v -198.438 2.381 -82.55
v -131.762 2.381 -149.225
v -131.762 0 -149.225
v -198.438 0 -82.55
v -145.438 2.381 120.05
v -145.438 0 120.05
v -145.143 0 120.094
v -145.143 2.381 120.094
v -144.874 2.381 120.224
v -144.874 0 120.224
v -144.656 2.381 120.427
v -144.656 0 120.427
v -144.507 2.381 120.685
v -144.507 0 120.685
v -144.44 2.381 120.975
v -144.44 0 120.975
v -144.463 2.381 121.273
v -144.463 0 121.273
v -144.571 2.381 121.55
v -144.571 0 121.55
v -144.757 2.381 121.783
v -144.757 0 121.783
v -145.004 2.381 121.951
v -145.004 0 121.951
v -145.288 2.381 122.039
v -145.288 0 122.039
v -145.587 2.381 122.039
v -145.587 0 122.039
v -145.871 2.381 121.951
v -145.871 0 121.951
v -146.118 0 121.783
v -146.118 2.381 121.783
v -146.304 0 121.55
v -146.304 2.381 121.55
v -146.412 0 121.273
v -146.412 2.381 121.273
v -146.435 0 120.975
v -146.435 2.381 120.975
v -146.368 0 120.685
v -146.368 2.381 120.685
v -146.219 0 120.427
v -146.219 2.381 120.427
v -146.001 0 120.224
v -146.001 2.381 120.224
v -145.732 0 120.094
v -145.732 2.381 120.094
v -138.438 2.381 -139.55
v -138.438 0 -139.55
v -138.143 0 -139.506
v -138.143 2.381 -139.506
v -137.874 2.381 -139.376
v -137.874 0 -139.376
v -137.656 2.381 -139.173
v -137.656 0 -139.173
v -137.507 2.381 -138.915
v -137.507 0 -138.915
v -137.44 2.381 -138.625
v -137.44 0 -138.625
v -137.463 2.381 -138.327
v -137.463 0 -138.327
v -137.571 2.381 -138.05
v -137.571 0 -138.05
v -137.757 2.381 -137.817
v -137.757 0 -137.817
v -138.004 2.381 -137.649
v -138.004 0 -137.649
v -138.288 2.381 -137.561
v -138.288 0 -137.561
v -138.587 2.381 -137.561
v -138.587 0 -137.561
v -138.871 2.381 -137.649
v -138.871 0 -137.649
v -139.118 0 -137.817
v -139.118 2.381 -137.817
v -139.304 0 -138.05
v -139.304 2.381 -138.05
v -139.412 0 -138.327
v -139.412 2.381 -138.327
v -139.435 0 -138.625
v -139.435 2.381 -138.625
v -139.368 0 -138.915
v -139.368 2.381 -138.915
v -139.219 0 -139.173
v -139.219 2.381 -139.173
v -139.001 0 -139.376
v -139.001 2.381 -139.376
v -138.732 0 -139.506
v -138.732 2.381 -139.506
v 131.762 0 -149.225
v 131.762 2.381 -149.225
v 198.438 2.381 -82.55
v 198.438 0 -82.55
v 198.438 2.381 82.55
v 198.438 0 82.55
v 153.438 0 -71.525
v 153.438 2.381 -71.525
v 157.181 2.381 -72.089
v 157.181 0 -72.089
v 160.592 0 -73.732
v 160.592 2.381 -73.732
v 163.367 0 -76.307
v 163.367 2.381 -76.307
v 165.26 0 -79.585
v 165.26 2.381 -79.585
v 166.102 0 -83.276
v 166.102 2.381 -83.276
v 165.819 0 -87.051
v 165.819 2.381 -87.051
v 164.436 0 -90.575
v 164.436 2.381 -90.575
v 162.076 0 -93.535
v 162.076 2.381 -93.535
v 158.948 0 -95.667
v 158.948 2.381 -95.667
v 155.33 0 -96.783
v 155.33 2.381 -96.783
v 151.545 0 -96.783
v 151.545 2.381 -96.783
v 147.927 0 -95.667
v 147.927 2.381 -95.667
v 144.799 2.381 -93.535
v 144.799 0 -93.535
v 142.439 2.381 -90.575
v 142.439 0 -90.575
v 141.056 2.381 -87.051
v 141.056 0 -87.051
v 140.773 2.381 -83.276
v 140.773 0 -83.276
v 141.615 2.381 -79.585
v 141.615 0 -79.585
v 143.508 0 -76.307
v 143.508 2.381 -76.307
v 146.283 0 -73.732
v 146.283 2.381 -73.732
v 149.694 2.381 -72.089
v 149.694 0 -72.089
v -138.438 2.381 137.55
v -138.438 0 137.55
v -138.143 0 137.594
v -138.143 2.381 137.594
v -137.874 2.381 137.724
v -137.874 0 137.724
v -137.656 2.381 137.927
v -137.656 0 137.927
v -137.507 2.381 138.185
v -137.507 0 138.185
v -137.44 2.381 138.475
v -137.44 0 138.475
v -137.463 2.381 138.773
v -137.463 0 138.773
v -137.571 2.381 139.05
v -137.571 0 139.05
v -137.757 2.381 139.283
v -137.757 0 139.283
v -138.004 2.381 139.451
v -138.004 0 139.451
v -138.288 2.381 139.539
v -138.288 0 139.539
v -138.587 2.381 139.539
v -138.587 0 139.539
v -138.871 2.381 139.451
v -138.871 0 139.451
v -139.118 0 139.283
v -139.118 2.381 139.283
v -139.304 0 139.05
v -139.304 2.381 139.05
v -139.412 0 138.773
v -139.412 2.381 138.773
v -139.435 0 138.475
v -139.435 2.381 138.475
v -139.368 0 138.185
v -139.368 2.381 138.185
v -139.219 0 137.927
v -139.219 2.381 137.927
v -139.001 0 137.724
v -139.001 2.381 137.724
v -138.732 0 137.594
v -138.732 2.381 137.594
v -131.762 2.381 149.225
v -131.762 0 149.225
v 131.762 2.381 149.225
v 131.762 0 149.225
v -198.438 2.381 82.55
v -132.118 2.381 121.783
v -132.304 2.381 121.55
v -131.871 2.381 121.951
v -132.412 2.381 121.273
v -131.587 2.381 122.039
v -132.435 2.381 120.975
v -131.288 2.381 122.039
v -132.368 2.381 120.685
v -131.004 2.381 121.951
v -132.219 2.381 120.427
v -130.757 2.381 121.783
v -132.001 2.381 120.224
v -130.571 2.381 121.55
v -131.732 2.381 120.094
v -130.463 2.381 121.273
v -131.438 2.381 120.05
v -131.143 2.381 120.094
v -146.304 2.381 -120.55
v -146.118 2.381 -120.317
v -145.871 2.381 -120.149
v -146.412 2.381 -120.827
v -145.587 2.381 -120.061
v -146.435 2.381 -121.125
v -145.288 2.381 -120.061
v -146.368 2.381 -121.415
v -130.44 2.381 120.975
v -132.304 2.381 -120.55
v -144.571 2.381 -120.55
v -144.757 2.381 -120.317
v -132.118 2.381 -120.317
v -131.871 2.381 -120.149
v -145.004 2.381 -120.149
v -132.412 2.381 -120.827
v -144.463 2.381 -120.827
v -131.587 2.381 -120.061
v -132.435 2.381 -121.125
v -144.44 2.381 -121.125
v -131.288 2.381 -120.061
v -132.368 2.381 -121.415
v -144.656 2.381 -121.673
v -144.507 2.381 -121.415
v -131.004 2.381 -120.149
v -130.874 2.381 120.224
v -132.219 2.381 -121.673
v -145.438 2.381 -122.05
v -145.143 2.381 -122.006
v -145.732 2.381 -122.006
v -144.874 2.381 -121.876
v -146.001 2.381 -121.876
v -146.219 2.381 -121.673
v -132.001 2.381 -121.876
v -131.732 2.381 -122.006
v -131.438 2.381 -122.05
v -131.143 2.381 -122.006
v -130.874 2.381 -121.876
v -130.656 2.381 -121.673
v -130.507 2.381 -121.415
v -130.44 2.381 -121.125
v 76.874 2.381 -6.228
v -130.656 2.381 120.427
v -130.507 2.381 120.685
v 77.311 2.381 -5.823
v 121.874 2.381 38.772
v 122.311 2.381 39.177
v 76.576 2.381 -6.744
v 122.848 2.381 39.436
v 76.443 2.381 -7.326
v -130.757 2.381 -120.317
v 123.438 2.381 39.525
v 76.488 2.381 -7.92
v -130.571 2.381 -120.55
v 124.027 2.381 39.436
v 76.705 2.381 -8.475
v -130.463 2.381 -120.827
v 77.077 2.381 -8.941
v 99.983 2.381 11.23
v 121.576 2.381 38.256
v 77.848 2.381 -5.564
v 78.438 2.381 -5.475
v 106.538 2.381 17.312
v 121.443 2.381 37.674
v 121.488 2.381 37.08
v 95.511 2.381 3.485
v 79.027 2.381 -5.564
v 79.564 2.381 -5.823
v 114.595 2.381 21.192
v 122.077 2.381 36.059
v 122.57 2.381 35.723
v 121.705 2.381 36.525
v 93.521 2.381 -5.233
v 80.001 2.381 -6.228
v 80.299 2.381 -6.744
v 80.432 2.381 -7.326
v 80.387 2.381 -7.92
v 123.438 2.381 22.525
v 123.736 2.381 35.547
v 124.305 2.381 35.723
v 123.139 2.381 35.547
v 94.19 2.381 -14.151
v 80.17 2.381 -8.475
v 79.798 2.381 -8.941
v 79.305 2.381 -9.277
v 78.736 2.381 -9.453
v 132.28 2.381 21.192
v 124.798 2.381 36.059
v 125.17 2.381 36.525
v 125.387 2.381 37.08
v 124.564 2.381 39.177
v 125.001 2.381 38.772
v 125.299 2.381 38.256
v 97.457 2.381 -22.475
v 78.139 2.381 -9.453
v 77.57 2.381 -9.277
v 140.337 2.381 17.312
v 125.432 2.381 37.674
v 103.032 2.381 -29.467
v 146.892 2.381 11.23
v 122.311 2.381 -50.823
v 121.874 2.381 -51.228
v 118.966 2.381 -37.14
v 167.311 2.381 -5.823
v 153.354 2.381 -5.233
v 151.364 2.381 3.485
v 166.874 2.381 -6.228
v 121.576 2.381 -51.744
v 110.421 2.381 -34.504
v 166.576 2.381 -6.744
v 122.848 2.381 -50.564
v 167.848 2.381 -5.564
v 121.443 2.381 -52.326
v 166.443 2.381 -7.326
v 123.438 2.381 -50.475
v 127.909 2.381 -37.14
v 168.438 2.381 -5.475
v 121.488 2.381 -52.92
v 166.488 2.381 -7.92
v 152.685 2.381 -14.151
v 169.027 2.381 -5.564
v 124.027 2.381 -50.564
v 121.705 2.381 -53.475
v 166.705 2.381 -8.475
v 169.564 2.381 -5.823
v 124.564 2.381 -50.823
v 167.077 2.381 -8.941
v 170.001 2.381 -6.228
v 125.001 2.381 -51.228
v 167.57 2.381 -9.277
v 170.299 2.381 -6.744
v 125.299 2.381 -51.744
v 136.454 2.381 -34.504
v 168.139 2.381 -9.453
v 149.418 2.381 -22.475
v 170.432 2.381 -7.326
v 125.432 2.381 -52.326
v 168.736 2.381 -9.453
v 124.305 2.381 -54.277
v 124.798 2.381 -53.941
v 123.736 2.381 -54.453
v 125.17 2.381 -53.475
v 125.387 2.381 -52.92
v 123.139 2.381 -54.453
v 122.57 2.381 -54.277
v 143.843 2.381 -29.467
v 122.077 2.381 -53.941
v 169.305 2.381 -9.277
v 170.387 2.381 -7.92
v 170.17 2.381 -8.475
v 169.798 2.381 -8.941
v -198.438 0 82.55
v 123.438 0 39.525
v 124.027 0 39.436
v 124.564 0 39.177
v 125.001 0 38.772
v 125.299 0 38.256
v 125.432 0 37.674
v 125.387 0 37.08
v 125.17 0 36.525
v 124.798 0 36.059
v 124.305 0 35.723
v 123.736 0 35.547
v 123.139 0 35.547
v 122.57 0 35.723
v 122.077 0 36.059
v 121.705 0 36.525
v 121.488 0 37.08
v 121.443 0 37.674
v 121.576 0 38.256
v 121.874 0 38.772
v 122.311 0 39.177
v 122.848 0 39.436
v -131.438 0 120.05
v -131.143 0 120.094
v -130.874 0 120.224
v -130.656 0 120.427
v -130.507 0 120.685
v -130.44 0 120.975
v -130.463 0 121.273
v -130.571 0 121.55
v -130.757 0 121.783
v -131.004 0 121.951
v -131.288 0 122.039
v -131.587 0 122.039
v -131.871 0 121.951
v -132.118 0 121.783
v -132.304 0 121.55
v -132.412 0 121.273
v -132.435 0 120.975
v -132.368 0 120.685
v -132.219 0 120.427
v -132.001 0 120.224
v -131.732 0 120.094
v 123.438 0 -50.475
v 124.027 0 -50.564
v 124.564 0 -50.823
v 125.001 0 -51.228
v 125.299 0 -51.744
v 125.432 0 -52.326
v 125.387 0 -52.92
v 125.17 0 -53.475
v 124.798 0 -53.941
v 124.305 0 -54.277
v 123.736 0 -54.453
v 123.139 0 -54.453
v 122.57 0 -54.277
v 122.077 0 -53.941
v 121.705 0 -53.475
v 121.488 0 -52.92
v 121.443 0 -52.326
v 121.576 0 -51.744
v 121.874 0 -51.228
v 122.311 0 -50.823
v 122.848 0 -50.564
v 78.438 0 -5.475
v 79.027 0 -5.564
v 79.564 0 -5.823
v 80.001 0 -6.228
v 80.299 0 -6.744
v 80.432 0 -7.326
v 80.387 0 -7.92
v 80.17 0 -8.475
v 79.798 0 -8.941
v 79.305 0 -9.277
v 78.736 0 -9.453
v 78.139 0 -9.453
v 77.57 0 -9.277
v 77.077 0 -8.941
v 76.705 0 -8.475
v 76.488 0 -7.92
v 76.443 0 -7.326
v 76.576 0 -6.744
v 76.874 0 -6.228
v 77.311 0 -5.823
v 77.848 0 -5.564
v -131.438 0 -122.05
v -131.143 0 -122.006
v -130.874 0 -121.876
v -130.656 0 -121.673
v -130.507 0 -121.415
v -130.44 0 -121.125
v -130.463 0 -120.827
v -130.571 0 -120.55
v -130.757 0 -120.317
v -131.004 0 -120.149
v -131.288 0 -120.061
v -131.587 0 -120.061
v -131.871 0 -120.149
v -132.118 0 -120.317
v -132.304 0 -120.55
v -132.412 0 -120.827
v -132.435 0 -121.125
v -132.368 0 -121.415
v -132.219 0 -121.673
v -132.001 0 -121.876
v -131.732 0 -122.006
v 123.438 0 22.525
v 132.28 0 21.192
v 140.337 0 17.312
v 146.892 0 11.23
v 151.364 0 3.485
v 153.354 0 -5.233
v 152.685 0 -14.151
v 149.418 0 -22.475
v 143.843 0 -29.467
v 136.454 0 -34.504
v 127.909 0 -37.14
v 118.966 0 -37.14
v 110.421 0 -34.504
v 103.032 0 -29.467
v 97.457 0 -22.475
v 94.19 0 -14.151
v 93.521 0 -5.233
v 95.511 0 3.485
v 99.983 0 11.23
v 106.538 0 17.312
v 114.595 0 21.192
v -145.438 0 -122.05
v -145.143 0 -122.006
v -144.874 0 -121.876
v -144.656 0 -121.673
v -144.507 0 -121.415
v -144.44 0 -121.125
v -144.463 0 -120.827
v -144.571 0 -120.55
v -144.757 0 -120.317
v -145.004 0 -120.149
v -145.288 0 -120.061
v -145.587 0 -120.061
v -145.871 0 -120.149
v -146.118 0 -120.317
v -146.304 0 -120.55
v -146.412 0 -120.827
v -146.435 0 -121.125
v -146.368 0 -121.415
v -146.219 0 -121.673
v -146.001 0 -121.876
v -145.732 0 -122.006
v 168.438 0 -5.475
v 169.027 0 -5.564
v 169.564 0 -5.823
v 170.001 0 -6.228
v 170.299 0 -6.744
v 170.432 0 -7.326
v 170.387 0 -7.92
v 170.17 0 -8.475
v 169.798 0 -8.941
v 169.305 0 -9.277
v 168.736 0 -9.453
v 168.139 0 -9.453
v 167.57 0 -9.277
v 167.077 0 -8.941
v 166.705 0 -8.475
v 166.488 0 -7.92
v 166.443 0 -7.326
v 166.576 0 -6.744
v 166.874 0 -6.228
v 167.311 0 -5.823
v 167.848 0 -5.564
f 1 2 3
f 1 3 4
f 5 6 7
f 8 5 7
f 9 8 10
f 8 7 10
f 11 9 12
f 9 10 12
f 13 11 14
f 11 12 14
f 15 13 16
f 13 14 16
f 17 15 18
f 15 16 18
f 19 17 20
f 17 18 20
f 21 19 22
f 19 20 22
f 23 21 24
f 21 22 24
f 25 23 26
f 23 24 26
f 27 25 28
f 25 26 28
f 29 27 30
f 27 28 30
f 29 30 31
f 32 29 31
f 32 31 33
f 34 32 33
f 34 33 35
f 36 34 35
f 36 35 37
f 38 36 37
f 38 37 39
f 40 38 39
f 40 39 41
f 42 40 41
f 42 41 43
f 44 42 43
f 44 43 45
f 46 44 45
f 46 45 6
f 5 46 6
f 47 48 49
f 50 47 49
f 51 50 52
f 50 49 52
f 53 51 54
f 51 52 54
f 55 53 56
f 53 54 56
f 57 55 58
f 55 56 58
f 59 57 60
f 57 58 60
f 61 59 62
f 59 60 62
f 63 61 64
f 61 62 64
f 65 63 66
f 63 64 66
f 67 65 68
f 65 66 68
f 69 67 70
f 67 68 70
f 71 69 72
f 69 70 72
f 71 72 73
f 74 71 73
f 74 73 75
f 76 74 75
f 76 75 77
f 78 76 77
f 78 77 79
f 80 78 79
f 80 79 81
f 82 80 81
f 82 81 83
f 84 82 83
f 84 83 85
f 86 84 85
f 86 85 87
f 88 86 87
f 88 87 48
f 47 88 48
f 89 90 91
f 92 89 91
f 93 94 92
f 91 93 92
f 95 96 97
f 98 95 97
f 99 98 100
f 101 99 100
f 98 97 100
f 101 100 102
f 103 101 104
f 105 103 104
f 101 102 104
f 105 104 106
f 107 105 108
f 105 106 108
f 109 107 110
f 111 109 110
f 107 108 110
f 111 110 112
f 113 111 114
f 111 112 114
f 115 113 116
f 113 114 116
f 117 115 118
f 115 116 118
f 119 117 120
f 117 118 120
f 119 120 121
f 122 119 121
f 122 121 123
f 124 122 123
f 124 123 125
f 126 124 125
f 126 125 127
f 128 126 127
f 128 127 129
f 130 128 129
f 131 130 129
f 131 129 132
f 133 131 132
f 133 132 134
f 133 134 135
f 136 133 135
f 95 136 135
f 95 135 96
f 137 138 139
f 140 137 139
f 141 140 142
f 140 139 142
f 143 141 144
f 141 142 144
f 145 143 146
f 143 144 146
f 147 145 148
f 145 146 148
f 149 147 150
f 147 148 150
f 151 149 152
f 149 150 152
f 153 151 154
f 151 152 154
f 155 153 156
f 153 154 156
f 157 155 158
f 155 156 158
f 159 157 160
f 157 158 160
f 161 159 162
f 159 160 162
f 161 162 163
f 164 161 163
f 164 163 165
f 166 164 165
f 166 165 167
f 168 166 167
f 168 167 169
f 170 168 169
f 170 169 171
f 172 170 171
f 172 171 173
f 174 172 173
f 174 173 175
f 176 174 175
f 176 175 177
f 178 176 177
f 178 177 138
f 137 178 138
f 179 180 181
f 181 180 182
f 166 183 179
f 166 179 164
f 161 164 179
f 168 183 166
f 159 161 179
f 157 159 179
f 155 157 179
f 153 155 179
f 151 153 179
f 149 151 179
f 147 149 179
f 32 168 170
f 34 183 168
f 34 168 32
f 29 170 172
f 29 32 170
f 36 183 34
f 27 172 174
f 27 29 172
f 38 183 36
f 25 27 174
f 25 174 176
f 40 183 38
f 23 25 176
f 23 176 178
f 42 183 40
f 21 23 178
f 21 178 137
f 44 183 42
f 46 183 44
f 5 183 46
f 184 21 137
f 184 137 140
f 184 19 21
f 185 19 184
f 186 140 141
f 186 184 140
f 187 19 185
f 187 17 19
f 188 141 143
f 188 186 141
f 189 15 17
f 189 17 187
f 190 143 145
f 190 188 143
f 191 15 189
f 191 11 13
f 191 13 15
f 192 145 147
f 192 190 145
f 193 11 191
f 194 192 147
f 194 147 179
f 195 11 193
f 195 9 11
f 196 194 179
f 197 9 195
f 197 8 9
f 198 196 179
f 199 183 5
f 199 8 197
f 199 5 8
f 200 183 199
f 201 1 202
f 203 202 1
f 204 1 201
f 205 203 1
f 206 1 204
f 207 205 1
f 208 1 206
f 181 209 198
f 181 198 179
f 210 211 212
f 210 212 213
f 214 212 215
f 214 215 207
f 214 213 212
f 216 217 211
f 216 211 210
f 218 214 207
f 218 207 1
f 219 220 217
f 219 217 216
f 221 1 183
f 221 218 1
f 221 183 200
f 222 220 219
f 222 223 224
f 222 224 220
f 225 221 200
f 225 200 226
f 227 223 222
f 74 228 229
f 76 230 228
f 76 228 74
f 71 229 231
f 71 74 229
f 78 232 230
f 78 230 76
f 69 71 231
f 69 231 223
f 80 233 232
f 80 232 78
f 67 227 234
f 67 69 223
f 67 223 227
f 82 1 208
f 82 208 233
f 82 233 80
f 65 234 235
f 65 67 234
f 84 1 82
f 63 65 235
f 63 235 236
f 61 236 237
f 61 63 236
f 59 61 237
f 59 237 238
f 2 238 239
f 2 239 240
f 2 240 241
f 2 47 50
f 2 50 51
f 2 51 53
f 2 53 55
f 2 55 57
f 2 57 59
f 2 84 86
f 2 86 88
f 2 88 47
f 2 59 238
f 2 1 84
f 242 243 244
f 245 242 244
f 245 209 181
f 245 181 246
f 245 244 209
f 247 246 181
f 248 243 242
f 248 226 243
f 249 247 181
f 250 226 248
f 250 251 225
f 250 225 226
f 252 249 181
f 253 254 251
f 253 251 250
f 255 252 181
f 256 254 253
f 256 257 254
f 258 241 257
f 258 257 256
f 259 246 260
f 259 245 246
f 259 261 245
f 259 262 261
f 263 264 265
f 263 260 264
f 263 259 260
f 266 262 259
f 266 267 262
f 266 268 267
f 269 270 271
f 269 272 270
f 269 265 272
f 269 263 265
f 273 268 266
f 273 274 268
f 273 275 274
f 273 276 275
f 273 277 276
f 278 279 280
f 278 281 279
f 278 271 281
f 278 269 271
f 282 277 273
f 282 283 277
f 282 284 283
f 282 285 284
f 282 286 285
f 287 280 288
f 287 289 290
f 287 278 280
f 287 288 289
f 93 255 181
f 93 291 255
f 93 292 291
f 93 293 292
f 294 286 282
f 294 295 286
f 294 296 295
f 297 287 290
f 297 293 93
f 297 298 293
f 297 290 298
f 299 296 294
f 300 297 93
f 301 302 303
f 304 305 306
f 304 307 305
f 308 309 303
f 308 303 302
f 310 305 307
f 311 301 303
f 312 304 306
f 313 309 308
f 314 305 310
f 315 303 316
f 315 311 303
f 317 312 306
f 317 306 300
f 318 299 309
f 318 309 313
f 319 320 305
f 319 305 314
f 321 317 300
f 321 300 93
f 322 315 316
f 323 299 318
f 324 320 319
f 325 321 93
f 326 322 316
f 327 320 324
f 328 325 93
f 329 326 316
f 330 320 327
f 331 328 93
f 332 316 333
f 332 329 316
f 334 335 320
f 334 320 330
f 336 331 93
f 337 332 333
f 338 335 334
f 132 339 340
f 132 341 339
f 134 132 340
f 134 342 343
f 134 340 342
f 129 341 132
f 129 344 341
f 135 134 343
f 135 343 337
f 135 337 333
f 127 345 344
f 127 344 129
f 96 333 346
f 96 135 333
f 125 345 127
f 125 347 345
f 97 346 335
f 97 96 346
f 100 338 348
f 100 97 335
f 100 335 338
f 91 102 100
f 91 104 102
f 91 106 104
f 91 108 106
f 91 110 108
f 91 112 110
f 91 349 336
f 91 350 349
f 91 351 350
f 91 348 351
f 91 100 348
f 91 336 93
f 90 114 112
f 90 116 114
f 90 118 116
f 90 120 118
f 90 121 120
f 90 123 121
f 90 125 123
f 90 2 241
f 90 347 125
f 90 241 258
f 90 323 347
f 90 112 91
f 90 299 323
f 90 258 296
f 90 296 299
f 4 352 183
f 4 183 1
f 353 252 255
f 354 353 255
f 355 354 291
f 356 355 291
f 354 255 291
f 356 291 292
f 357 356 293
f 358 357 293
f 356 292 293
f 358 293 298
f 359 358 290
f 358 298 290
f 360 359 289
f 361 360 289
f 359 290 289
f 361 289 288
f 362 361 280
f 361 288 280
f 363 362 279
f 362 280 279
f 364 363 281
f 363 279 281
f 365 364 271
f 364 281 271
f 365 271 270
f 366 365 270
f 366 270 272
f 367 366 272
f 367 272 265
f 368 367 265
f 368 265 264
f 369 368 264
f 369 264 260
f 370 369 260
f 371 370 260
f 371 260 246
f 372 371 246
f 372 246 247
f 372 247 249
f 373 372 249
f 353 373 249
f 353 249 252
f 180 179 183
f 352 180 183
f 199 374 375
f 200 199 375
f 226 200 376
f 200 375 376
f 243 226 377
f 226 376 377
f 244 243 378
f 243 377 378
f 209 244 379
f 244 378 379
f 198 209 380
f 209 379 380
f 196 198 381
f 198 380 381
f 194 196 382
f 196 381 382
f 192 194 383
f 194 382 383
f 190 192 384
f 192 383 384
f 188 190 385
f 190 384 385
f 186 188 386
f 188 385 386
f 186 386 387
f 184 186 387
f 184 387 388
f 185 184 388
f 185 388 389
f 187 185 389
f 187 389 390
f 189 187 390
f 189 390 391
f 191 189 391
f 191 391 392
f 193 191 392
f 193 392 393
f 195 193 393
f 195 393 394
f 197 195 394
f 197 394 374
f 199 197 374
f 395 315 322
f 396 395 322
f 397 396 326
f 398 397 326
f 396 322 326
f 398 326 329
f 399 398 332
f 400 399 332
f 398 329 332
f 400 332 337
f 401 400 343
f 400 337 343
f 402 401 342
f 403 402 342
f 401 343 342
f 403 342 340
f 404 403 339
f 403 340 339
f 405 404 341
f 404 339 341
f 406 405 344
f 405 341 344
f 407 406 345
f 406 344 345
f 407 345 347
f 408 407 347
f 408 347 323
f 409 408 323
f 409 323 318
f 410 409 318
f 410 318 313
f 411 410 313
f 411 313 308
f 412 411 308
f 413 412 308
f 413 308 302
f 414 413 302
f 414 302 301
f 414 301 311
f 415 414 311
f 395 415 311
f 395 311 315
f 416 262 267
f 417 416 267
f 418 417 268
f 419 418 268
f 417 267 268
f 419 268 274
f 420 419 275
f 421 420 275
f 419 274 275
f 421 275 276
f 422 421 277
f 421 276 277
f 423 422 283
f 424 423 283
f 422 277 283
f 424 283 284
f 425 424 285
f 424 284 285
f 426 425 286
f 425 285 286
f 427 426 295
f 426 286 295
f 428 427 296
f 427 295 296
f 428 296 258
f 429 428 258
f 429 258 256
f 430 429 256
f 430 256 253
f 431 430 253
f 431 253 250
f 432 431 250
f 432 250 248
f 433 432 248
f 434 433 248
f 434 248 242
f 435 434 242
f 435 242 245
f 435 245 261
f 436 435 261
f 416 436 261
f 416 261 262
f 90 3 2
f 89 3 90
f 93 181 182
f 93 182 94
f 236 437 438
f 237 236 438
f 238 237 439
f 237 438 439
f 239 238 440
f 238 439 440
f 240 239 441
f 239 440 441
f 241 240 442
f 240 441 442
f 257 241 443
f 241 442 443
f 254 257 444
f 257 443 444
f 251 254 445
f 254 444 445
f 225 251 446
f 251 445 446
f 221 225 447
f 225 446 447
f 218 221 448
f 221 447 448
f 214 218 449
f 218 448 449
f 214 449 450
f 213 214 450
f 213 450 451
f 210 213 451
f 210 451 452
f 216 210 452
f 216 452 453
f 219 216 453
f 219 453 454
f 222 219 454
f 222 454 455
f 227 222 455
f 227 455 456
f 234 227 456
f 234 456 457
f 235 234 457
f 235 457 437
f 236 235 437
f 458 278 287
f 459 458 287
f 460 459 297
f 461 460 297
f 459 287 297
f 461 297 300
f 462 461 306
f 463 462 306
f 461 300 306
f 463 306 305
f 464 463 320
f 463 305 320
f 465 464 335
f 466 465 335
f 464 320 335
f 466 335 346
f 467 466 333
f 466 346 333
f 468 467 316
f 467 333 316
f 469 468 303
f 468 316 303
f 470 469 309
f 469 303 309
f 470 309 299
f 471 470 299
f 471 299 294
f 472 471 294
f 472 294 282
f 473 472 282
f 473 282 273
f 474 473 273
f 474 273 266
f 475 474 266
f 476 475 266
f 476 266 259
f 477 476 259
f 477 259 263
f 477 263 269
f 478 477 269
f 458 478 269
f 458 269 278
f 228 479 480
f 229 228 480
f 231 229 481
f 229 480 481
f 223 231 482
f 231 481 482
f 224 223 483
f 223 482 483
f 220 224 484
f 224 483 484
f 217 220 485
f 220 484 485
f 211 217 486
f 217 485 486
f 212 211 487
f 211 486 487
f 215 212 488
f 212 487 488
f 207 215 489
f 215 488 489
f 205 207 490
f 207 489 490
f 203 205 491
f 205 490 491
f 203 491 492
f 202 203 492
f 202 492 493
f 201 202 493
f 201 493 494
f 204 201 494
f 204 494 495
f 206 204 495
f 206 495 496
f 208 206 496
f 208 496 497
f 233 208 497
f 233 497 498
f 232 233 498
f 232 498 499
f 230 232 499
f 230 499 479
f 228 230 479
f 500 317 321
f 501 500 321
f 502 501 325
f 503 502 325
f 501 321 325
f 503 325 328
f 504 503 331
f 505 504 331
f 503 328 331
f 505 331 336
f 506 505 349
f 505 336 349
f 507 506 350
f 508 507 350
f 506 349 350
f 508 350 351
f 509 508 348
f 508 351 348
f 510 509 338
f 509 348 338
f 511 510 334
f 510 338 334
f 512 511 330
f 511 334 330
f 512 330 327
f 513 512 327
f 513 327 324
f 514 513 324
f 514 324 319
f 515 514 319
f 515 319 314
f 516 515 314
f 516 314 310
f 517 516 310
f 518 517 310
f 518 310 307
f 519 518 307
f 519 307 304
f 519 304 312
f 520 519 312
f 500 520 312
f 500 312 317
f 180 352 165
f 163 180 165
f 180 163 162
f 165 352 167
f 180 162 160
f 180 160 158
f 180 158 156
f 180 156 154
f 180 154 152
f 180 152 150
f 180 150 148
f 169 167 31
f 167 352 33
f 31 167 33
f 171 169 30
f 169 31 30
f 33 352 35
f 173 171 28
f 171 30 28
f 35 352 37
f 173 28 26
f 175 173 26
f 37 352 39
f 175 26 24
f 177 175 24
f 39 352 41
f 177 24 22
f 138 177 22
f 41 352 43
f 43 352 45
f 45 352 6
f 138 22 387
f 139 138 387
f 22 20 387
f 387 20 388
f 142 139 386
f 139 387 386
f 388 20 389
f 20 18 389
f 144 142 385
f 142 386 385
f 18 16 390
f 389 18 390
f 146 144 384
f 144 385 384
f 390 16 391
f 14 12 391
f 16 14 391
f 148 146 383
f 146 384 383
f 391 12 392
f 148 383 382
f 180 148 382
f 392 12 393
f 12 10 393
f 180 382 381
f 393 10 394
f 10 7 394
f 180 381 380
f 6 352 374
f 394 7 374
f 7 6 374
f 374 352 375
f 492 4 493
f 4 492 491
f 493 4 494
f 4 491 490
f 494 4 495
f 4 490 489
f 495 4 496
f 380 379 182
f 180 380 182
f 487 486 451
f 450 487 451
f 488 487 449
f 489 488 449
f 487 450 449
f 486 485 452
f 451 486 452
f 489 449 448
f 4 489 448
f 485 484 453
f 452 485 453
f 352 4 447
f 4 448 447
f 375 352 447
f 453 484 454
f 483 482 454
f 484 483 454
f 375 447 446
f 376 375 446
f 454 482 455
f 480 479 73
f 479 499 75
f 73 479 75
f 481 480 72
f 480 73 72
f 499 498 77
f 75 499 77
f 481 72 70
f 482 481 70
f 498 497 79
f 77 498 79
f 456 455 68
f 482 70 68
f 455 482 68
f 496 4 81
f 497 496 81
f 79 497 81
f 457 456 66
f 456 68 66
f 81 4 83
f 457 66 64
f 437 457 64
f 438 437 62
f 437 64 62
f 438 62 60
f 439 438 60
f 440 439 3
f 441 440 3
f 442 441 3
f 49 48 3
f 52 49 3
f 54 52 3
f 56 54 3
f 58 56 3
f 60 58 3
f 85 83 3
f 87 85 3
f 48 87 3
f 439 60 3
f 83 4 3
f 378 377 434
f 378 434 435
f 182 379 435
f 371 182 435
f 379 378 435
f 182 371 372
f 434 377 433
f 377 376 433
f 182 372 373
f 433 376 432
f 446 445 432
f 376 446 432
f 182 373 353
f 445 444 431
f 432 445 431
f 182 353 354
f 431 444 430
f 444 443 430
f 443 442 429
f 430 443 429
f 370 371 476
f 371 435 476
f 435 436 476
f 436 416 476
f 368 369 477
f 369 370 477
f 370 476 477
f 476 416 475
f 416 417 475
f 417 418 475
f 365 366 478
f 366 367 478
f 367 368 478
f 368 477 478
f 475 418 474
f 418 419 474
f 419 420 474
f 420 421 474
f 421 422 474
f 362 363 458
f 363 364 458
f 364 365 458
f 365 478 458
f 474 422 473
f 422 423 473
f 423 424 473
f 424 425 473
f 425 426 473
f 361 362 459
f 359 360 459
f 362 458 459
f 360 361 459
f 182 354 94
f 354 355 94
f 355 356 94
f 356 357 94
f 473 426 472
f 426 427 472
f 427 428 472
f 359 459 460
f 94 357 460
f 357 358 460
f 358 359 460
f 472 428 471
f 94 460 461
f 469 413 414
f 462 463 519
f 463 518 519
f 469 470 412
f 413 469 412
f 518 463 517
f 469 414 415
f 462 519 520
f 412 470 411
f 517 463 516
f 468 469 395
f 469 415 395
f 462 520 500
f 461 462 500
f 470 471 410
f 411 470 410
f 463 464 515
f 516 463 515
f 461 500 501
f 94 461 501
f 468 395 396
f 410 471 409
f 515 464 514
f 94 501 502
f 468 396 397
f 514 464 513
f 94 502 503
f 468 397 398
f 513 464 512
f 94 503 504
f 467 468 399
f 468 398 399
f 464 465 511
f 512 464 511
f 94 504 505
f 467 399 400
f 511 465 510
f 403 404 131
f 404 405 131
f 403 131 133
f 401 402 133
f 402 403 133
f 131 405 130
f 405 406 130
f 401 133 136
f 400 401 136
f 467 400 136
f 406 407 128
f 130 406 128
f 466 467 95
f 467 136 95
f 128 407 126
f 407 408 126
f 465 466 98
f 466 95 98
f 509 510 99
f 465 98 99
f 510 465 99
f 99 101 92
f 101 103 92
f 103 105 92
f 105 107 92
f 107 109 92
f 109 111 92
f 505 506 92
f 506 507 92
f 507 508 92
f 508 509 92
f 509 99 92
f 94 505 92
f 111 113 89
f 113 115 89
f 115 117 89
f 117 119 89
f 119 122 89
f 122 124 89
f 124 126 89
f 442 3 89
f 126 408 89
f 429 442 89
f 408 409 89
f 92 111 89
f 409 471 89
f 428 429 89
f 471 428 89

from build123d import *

# Parameters (mm, degrees)
SKETCH1_W           = 396.875
SKETCH1_H           = 298.45
BOSS_EXTRUDE1_DEPTH = 2.38125
SKETCH5_R           = 1
CUT_EXTRUDE4_DEPTH  = 10
SKETCH6_R           = 2
SKETCH6_R_2         = 30
CUT_EXTRUDE5_DEPTH  = 10
SKETCH7_R           = 12.7
CUT_EXTRUDE6_DEPTH  = 10
CUT_EXTRUDE7_DEPTH  = 10


with BuildPart() as part:
    # Sketch1 → Boss-Extrude1 (new body)
    with BuildSketch(Plane(origin=(0, 0, 0), x_dir=(1, 0, 0), z_dir=(0, 1, 0))):
        Rectangle(SKETCH1_W, SKETCH1_H)
    extrude(amount=BOSS_EXTRUDE1_DEPTH)

    # Sketch5 → Cut-Extrude4 (cut)
    with BuildSketch(Plane.XZ):
        with Locations(Location((-138.4375, 138.55, 0), (0, 0, 270))):
            Circle(SKETCH5_R)
        with Locations(Location((-138.4375, -138.55, 0), (0, 0, 270))):
            Circle(SKETCH5_R)
        with Locations(Location((-131.4375, -121.05, 0), (0, 0, 270))):
            Circle(SKETCH5_R)
        with Locations(Location((-131.4375, 121.05, 0), (0, 0, 270))):
            Circle(SKETCH5_R)
        with Locations(Location((-145.4375, 121.05, 0), (0, 0, 270))):
            Circle(SKETCH5_R)
        with Locations(Location((-145.4375, -121.05, 0), (0, 0, 270))):
            Circle(SKETCH5_R)
    extrude(amount=-CUT_EXTRUDE4_DEPTH, mode=Mode.SUBTRACT)

    # Sketch6 → Cut-Extrude5 (cut)
    with BuildSketch(Plane(origin=(0, 2.38125, 0), x_dir=(1, 0, 0), z_dir=(0, 1, 0))):
        with Locations(Location((123.4375, 52.475, 0), (0, 0, 270))):
            Circle(SKETCH6_R)
        with Locations(Location((123.4375, -37.525, 0), (0, 0, 270))):
            Circle(SKETCH6_R)
        with Locations(Location((168.4375, 7.475, 0), (0, 0, 270))):
            Circle(SKETCH6_R)
        with Locations(Location((78.4375, 7.475, 0), (0, 0, 270))):
            Circle(SKETCH6_R)
        with Locations(Location((123.4375, 7.475, 0), (0, 0, 270))):
            Circle(SKETCH6_R_2)
    extrude(amount=-CUT_EXTRUDE5_DEPTH, mode=Mode.SUBTRACT)

    # Sketch7 → Cut-Extrude6 (cut)
    with BuildSketch(Plane(origin=(0, 2.38125, 0), x_dir=(1, 0, 0), z_dir=(0, 1, 0))):
        with Locations(Location((153.4375, 84.225, 0), (0, 0, 270))):
            Circle(SKETCH7_R)
    extrude(amount=-CUT_EXTRUDE6_DEPTH, mode=Mode.SUBTRACT)

    # Sketch8 → Cut-Extrude7 (cut)
    with BuildSketch(Plane(origin=(0, 2.38125, 0), x_dir=(1, 0, 0), z_dir=(0, 1, 0))):
        Polygon((131.7625, -149.225), (198.4375, -82.55), (198.4375, -149.225), align=None)
        Polygon((198.4375, 149.225), (131.7625, 149.225), (198.4375, 82.55), align=None)
    cut_extrude7 = extrude(amount=-CUT_EXTRUDE7_DEPTH, mode=Mode.SUBTRACT)

    # Mirror1: Cut-Extrude7 across plane
    add(cut_extrude7.mirror(Plane(origin=(0, 0, 0), x_dir=(0, 0, 1), z_dir=(1, 0, 0))), mode=Mode.SUBTRACT)


solid = part.part
